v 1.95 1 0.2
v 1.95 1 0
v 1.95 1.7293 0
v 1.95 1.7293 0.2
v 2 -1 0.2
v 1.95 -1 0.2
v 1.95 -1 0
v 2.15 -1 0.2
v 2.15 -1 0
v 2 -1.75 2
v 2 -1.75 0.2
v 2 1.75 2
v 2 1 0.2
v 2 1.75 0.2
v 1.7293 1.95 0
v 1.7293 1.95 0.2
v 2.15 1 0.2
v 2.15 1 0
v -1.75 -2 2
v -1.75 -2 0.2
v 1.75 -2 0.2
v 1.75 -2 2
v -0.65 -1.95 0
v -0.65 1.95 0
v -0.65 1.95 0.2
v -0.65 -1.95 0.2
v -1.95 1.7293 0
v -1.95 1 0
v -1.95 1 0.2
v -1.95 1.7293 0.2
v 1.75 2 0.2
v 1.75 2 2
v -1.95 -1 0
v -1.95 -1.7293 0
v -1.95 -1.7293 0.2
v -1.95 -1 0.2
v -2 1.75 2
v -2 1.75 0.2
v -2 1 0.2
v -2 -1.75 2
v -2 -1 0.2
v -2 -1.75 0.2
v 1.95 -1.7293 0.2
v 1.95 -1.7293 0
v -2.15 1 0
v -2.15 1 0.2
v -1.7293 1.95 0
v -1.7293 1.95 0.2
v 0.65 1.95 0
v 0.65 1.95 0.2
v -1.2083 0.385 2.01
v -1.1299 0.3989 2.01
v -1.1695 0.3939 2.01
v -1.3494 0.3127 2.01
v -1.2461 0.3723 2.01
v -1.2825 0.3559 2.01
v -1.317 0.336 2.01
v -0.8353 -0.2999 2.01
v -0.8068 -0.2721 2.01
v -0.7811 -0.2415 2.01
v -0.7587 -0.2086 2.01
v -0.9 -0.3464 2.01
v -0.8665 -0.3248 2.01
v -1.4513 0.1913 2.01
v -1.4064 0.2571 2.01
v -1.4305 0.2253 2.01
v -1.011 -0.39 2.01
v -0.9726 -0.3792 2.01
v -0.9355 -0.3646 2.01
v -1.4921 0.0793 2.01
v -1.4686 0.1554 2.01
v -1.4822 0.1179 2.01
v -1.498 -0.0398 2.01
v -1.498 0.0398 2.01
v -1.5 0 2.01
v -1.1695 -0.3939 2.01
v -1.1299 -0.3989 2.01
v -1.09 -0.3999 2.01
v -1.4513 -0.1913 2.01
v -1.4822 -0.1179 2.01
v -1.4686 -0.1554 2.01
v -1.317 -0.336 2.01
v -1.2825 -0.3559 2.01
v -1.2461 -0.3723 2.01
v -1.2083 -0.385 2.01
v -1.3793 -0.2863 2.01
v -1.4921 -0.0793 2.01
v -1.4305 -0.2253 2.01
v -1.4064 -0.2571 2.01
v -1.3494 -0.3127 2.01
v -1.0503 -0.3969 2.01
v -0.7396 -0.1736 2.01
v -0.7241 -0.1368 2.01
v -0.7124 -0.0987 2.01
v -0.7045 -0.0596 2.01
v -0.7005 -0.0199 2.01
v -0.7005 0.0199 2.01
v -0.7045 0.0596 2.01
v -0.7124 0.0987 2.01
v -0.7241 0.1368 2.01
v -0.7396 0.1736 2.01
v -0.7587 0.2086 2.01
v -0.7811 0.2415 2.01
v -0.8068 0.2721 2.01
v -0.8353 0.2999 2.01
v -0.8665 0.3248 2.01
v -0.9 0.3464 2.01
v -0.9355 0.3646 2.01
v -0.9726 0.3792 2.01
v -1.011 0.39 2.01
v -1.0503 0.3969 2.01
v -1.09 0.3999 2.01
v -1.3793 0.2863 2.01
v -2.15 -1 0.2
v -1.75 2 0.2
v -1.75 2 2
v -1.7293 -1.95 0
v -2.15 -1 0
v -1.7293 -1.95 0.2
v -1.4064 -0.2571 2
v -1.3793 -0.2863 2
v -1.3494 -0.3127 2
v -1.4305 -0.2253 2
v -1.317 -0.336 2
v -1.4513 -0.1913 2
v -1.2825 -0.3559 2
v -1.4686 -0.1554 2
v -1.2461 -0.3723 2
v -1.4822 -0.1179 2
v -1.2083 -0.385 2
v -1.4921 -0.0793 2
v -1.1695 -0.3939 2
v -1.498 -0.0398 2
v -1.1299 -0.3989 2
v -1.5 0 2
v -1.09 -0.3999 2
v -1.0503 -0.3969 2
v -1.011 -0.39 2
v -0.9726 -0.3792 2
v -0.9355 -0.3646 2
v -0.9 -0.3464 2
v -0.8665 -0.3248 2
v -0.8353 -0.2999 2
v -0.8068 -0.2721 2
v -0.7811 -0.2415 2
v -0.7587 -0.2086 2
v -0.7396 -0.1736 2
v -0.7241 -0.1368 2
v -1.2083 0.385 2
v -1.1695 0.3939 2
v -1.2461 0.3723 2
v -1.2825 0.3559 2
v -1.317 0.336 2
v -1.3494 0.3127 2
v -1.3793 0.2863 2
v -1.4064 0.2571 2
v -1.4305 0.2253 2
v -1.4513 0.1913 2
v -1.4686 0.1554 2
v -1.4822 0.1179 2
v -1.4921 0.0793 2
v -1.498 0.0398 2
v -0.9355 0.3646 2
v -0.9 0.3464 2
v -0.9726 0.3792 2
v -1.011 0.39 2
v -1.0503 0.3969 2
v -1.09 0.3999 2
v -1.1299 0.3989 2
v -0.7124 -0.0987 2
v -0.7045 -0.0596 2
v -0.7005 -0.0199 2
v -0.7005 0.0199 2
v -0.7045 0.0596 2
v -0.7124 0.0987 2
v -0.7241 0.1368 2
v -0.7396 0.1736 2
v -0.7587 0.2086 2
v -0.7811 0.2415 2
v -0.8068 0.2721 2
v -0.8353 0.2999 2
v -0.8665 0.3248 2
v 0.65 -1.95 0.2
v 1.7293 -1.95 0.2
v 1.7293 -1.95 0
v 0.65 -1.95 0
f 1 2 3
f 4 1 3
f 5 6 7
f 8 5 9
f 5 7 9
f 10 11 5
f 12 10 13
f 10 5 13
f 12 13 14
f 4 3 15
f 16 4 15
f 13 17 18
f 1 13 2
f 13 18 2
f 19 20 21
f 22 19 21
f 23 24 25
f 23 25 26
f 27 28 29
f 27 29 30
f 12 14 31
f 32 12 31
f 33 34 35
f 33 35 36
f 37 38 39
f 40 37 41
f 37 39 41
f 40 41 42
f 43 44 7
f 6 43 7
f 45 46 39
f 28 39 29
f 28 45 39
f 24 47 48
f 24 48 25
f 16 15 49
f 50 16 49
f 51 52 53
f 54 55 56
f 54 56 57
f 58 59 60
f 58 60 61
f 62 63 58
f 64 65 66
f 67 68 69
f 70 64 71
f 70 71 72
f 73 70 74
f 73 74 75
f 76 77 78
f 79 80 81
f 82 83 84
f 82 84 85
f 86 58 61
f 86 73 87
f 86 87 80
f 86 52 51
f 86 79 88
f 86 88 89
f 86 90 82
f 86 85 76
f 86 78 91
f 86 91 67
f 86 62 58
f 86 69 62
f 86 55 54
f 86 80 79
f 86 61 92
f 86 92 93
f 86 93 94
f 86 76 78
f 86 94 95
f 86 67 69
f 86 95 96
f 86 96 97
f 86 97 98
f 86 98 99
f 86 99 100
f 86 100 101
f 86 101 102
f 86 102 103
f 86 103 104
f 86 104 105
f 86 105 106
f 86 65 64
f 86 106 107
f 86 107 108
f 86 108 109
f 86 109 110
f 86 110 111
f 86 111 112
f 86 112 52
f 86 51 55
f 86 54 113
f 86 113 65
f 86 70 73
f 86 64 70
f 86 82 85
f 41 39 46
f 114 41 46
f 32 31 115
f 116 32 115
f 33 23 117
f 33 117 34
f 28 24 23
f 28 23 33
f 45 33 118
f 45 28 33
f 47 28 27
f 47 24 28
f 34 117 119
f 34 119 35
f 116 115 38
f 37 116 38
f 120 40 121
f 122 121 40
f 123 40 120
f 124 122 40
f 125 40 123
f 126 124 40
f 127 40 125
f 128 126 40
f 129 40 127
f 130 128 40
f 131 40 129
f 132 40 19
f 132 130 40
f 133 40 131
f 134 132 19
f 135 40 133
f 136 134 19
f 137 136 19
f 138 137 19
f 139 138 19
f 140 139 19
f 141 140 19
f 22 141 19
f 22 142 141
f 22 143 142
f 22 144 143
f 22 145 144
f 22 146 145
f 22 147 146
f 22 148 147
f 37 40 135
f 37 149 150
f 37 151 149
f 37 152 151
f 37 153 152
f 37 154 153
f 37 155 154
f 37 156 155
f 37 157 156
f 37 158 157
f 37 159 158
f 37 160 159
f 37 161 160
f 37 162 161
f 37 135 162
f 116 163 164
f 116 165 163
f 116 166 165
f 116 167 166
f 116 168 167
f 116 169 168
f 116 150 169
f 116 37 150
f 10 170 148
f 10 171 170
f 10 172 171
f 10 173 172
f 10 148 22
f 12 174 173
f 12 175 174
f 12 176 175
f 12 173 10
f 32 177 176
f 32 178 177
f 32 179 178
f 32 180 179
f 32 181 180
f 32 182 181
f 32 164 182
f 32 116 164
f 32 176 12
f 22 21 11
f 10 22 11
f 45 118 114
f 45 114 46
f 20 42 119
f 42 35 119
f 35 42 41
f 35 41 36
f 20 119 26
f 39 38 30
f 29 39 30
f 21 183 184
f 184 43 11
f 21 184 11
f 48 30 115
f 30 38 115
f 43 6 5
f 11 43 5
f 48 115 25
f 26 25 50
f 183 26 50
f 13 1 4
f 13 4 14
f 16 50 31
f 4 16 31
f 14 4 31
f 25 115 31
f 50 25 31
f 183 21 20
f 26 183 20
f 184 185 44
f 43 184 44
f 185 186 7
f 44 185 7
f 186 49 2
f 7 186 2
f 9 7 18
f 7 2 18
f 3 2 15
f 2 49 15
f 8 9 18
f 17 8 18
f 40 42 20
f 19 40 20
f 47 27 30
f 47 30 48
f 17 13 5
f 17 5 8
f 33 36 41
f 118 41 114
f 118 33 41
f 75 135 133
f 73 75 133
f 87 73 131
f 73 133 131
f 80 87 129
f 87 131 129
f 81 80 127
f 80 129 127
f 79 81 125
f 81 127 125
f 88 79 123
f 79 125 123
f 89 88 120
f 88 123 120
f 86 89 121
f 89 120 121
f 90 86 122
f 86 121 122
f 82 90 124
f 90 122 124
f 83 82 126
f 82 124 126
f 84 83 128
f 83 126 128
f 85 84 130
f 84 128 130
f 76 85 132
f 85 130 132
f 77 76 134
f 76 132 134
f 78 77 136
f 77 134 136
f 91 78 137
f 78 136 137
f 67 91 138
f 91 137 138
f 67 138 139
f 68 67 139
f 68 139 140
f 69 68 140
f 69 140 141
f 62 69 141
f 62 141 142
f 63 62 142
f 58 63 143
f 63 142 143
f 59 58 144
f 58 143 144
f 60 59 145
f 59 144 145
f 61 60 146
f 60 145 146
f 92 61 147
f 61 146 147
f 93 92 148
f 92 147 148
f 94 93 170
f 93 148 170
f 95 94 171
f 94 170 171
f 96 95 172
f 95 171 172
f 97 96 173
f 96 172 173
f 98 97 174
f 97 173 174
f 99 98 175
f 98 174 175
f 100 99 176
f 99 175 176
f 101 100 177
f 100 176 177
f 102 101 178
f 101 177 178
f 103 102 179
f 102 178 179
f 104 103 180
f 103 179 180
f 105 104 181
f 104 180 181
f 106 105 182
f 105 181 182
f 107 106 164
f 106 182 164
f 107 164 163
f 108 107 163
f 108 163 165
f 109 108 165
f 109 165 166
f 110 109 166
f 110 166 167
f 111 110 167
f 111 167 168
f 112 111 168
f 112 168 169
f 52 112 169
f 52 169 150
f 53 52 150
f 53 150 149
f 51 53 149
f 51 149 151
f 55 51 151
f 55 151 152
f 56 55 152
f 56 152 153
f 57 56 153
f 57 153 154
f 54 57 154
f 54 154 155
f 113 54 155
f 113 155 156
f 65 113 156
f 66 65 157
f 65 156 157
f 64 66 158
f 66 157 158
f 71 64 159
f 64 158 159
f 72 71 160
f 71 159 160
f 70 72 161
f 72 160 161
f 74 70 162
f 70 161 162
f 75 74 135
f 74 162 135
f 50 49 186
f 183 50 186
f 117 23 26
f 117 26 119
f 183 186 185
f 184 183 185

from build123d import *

# Parameters (mm, degrees)
BODY_START  = 0.2
BODY_DEPTH  = 1.8
PINS_DEPTH  = 0.2
ESQUISSE3_R = 0.4
MARK_DEPTH  = 0.01


with BuildPart() as part:
    # Esquisse1 → body (new body)
    with BuildSketch(Plane.XY.offset(BODY_START)):
        Polygon((2, -1.75), (2, 1.75), (1.75, 2), (-1.75, 2), (-2, 1.75), (-2, -1.75), (-1.75, -2), (1.75, -2), align=None)
    extrude(amount=BODY_DEPTH)

    # Esquisse2 → pins (add)
    with BuildSketch(Plane.XY):
        Polygon((0.65, 1.95), (0.65, -1.95), (1.729289322, -1.95), (1.95, -1.729289322), (1.95, -1), (2.15, -1), (2.15, 1), (1.95, 1), (1.95, 1.729289322), (1.729289322, 1.95), align=None)
        Polygon((-0.65, 1.95), (-0.65, -1.95), (-1.729289322, -1.95), (-1.95, -1.729289322), (-1.95, -1), (-2.15, -1), (-2.15, 1), (-1.95, 1), (-1.95, 1.729289322), (-1.729289322, 1.95), align=None)
    extrude(amount=PINS_DEPTH)

    # Esquisse3 → mark (add)
    with BuildSketch(Plane.XY.offset(2)):
        with Locations(Location((-1.1, 0, 0), (0, 0, 180))):
            Circle(ESQUISSE3_R)
    extrude(amount=MARK_DEPTH)


solid = part.part
